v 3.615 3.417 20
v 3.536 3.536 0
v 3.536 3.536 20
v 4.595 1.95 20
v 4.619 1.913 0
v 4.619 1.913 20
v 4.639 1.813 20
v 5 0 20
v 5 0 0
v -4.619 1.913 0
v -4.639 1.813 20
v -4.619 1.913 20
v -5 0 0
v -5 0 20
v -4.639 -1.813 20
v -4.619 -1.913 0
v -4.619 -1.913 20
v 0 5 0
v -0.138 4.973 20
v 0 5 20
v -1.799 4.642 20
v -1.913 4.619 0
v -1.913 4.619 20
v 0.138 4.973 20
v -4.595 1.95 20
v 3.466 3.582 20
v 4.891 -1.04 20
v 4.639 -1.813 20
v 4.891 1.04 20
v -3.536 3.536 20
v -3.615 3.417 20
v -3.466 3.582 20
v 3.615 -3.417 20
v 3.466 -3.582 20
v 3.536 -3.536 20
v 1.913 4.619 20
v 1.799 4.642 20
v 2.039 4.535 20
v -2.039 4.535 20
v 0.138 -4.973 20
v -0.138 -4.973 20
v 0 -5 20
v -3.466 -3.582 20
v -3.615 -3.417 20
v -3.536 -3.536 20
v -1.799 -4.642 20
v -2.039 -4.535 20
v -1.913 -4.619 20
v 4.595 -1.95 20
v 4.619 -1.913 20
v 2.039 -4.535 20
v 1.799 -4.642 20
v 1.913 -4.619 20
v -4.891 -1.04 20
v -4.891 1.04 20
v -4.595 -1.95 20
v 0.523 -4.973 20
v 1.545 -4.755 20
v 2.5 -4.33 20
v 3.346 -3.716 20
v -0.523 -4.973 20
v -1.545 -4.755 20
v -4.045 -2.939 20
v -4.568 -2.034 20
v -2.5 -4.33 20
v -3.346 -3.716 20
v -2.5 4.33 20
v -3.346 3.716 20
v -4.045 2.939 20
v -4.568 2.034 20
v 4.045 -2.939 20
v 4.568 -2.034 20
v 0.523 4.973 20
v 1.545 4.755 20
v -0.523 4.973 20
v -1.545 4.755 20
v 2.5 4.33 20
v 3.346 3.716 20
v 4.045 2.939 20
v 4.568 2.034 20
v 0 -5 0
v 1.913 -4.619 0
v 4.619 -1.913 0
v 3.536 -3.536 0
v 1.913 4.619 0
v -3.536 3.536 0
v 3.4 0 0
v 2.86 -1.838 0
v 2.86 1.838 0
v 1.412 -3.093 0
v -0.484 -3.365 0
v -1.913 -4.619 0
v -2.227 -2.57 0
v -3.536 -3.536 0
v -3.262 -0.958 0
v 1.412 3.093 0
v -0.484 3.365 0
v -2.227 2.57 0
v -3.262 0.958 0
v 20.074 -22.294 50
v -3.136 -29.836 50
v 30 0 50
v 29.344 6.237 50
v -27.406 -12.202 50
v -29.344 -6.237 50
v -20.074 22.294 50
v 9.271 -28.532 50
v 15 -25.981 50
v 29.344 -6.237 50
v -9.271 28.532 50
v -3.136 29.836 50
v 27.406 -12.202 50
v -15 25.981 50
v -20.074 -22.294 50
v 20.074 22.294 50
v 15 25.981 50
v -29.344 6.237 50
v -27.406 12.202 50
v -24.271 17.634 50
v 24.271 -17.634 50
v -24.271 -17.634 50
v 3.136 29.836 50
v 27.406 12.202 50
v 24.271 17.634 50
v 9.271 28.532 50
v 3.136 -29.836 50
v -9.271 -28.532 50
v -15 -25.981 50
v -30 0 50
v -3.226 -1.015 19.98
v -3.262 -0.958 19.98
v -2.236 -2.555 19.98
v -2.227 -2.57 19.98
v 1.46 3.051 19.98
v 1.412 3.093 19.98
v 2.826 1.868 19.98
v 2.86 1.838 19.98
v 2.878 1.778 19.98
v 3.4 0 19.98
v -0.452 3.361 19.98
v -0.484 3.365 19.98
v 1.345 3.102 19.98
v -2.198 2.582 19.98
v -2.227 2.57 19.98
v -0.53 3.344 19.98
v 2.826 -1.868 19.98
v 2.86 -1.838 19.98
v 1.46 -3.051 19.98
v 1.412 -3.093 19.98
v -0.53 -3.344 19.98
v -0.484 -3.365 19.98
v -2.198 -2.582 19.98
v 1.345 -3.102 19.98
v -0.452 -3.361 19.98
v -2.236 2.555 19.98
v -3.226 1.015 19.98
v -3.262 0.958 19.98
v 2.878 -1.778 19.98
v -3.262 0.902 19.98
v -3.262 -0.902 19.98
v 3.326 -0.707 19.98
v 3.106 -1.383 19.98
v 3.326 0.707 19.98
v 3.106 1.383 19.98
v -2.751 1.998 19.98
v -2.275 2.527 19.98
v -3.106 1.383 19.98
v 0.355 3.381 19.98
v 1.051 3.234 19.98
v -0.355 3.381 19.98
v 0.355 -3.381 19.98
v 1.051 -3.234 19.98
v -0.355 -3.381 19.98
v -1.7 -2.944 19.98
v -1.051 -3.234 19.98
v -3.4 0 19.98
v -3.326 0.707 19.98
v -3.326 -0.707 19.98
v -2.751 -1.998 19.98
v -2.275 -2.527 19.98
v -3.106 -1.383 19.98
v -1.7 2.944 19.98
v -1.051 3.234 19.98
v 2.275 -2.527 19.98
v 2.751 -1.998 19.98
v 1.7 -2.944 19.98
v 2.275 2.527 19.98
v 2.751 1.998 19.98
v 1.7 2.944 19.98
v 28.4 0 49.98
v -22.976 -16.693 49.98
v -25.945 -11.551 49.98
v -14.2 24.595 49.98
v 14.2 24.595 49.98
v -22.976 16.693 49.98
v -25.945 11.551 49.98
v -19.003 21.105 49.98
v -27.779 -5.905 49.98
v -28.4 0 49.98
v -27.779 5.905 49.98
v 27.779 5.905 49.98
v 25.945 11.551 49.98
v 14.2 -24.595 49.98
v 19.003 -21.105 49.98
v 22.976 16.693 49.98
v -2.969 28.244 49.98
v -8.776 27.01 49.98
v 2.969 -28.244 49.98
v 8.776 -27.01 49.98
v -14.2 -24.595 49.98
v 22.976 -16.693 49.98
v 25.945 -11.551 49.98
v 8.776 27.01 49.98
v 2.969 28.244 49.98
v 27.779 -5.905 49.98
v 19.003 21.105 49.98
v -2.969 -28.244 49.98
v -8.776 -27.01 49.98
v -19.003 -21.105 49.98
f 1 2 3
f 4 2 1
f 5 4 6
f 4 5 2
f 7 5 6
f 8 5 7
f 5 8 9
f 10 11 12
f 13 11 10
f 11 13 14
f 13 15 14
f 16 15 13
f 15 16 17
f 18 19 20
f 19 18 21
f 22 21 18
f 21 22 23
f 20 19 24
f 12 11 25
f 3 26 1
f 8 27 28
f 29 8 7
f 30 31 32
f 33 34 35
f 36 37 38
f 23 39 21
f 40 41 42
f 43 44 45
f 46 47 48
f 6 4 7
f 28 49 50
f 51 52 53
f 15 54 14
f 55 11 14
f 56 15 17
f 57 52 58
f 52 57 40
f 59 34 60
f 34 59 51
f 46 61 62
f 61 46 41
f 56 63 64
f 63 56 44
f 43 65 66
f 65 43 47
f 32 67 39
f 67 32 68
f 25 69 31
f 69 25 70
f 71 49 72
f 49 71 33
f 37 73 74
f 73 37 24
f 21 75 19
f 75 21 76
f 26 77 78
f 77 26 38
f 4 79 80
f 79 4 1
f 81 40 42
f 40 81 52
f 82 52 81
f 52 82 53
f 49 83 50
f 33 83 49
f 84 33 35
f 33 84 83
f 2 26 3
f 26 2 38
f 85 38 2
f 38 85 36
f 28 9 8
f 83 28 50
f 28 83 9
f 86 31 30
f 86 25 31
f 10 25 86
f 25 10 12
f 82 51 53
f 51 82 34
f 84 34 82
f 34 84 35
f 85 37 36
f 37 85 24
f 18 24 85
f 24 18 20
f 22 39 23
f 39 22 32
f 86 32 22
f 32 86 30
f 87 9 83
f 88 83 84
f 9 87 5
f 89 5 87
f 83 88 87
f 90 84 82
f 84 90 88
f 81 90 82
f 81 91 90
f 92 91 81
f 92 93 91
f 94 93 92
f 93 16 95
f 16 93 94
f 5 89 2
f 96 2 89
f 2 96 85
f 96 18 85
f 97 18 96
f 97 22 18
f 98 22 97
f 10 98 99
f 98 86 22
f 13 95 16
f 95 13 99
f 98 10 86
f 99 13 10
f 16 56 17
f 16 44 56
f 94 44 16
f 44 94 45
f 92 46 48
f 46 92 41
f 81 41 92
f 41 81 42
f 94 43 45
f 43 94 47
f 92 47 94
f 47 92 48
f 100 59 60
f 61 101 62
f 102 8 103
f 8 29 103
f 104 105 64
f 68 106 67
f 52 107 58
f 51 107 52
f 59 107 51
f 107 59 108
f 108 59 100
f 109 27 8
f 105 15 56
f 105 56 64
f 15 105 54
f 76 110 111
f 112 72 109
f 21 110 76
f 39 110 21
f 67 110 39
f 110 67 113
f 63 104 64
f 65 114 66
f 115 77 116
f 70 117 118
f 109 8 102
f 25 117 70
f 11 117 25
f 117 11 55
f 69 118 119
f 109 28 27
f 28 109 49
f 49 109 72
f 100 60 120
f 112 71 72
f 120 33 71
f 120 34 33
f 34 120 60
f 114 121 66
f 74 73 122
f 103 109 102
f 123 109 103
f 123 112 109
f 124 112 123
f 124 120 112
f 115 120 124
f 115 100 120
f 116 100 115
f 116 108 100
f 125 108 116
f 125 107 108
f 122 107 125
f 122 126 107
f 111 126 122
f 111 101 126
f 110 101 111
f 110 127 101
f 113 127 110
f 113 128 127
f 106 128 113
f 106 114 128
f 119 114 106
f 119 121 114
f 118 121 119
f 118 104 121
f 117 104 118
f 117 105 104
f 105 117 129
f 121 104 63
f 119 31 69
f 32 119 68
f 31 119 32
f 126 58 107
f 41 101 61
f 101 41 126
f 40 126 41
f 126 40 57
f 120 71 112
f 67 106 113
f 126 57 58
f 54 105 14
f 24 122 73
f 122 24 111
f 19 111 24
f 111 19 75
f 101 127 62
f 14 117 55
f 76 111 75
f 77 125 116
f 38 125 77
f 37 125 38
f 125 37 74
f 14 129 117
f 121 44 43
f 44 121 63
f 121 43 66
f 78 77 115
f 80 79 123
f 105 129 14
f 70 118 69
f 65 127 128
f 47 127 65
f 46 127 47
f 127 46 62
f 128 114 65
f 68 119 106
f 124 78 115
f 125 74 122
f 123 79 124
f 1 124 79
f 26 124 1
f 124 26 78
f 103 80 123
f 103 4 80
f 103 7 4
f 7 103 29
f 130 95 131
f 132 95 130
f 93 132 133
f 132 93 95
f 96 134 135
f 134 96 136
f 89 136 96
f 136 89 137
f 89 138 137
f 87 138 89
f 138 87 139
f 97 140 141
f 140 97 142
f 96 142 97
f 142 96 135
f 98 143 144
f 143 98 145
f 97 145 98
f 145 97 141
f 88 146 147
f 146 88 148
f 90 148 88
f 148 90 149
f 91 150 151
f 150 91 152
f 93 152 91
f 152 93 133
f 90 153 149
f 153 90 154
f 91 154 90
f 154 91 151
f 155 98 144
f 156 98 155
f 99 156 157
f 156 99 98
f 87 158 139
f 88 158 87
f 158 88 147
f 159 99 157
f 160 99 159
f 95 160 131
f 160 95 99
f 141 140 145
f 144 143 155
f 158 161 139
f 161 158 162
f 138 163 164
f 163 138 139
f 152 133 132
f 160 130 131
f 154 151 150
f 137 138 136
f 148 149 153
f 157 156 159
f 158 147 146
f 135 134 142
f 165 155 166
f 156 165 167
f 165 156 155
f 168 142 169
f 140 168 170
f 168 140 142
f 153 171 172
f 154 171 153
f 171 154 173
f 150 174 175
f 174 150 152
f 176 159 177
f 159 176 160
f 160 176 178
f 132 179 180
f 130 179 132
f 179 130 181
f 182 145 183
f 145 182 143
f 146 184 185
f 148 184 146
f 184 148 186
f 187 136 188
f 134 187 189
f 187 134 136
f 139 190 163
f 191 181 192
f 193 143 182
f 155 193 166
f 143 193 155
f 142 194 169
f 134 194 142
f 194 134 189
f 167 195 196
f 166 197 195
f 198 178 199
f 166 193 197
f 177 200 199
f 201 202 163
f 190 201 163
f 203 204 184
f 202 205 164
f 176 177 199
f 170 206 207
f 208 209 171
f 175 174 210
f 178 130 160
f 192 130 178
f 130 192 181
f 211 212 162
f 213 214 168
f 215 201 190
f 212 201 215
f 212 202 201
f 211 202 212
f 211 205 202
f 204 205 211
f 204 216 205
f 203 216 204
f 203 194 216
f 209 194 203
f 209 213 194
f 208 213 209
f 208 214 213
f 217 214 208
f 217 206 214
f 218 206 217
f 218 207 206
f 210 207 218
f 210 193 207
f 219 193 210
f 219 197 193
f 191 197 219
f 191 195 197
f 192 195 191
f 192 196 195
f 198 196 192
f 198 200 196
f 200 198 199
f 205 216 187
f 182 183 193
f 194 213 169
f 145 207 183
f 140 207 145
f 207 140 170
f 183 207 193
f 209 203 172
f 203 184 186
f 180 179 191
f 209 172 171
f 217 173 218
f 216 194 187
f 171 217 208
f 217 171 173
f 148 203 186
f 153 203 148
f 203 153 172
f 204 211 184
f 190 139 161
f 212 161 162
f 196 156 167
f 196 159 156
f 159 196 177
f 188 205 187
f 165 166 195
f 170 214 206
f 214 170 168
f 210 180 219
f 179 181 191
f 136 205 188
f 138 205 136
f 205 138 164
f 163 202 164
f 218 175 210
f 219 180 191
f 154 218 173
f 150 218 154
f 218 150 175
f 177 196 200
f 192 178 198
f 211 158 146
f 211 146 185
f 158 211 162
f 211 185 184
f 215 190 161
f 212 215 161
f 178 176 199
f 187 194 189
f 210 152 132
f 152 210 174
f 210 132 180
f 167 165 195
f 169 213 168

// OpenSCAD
// Lab Funnel Design
// Units: millimetres
// Print orientation: Upright (XY plane at z=0, builds +Z)
// Centered on origin in X and Y.

// --- Dimensions ---
// Spout dimensions
spout_od = 10.0;       // Outer diameter of the straight spout
spout_height = 20.0;    // Height of the straight spout section
spout_thickness = 1.6; // Wall thickness
spout_id = spout_od - 2 * spout_thickness; // Inner diameter of spout (6.8 mm)

// Funnel (Cone) dimensions
funnel_height = 30.0;   // Height of the cone section (from z=20 to z=50)
funnel_rim_od = 60.0;   // Outer diameter at the top rim
funnel_rim_id = funnel_rim_od - 2 * spout_thickness; // Inner diameter at rim (56.8 mm)

// --- Calculated Values ---
// Radii
spout_r = spout_od / 2;
spout_inner_r = spout_id / 2;
funnel_rim_r = funnel_rim_od / 2;
funnel_rim_inner_r = funnel_rim_id / 2;

// Total height
total_height = spout_height + funnel_height;

// Epsilon for cutting tolerance (Rule 5: extend 0.01-1 mm past faces)
epsilon = 0.02;

// --- Construction Modules ---

// Module to create the outer solid shape
module outer_shape() {
    // 1. Straight Spout (Cylinder)
    // Extends from z=0 to z=20
    cylinder(h = spout_height, r = spout_r, center = false);
    
    // 2. Funnel Cone (Cone)
    // Extends from z=20 to z=50.
    // Bottom radius = spout_r, Top radius = funnel_rim_r.
    translate([0, 0, spout_height]) {
        cylinder(h = funnel_height, r1 = spout_r, r2 = funnel_rim_r, center = false);
    }
}

// Module to create the inner void shape
module inner_shape() {
    // 1. Straight Spout Bore (Cylinder)
    // Extends from z=0 to z=20
    cylinder(h = spout_height, r = spout_inner_r, center = false);
    
    // 2. Funnel Bore (Cone)
    // Extends from z=20 to z=50.
    // Bottom radius = spout_inner_r, Top radius = funnel_rim_inner_r.
    translate([0, 0, spout_height]) {
        cylinder(h = funnel_height, r1 = spout_inner_r, r2 = funnel_rim_inner_r, center = false);
    }
}

// --- Final Part Construction ---
// We use difference() to subtract the inner void from the outer solid.
// The inner shape is extended slightly to ensure clean cuts (Rule 5).
difference() {
    // The solid outer shell
    outer_shape();
    
    // The hollow inner void
    // We shift the inner shape slightly downwards to ensure it cuts through the bottom face
    // and extends slightly past the top face to avoid coplanar faces.
    translate([0, 0, -epsilon]) {
        inner_shape();
    }
}
